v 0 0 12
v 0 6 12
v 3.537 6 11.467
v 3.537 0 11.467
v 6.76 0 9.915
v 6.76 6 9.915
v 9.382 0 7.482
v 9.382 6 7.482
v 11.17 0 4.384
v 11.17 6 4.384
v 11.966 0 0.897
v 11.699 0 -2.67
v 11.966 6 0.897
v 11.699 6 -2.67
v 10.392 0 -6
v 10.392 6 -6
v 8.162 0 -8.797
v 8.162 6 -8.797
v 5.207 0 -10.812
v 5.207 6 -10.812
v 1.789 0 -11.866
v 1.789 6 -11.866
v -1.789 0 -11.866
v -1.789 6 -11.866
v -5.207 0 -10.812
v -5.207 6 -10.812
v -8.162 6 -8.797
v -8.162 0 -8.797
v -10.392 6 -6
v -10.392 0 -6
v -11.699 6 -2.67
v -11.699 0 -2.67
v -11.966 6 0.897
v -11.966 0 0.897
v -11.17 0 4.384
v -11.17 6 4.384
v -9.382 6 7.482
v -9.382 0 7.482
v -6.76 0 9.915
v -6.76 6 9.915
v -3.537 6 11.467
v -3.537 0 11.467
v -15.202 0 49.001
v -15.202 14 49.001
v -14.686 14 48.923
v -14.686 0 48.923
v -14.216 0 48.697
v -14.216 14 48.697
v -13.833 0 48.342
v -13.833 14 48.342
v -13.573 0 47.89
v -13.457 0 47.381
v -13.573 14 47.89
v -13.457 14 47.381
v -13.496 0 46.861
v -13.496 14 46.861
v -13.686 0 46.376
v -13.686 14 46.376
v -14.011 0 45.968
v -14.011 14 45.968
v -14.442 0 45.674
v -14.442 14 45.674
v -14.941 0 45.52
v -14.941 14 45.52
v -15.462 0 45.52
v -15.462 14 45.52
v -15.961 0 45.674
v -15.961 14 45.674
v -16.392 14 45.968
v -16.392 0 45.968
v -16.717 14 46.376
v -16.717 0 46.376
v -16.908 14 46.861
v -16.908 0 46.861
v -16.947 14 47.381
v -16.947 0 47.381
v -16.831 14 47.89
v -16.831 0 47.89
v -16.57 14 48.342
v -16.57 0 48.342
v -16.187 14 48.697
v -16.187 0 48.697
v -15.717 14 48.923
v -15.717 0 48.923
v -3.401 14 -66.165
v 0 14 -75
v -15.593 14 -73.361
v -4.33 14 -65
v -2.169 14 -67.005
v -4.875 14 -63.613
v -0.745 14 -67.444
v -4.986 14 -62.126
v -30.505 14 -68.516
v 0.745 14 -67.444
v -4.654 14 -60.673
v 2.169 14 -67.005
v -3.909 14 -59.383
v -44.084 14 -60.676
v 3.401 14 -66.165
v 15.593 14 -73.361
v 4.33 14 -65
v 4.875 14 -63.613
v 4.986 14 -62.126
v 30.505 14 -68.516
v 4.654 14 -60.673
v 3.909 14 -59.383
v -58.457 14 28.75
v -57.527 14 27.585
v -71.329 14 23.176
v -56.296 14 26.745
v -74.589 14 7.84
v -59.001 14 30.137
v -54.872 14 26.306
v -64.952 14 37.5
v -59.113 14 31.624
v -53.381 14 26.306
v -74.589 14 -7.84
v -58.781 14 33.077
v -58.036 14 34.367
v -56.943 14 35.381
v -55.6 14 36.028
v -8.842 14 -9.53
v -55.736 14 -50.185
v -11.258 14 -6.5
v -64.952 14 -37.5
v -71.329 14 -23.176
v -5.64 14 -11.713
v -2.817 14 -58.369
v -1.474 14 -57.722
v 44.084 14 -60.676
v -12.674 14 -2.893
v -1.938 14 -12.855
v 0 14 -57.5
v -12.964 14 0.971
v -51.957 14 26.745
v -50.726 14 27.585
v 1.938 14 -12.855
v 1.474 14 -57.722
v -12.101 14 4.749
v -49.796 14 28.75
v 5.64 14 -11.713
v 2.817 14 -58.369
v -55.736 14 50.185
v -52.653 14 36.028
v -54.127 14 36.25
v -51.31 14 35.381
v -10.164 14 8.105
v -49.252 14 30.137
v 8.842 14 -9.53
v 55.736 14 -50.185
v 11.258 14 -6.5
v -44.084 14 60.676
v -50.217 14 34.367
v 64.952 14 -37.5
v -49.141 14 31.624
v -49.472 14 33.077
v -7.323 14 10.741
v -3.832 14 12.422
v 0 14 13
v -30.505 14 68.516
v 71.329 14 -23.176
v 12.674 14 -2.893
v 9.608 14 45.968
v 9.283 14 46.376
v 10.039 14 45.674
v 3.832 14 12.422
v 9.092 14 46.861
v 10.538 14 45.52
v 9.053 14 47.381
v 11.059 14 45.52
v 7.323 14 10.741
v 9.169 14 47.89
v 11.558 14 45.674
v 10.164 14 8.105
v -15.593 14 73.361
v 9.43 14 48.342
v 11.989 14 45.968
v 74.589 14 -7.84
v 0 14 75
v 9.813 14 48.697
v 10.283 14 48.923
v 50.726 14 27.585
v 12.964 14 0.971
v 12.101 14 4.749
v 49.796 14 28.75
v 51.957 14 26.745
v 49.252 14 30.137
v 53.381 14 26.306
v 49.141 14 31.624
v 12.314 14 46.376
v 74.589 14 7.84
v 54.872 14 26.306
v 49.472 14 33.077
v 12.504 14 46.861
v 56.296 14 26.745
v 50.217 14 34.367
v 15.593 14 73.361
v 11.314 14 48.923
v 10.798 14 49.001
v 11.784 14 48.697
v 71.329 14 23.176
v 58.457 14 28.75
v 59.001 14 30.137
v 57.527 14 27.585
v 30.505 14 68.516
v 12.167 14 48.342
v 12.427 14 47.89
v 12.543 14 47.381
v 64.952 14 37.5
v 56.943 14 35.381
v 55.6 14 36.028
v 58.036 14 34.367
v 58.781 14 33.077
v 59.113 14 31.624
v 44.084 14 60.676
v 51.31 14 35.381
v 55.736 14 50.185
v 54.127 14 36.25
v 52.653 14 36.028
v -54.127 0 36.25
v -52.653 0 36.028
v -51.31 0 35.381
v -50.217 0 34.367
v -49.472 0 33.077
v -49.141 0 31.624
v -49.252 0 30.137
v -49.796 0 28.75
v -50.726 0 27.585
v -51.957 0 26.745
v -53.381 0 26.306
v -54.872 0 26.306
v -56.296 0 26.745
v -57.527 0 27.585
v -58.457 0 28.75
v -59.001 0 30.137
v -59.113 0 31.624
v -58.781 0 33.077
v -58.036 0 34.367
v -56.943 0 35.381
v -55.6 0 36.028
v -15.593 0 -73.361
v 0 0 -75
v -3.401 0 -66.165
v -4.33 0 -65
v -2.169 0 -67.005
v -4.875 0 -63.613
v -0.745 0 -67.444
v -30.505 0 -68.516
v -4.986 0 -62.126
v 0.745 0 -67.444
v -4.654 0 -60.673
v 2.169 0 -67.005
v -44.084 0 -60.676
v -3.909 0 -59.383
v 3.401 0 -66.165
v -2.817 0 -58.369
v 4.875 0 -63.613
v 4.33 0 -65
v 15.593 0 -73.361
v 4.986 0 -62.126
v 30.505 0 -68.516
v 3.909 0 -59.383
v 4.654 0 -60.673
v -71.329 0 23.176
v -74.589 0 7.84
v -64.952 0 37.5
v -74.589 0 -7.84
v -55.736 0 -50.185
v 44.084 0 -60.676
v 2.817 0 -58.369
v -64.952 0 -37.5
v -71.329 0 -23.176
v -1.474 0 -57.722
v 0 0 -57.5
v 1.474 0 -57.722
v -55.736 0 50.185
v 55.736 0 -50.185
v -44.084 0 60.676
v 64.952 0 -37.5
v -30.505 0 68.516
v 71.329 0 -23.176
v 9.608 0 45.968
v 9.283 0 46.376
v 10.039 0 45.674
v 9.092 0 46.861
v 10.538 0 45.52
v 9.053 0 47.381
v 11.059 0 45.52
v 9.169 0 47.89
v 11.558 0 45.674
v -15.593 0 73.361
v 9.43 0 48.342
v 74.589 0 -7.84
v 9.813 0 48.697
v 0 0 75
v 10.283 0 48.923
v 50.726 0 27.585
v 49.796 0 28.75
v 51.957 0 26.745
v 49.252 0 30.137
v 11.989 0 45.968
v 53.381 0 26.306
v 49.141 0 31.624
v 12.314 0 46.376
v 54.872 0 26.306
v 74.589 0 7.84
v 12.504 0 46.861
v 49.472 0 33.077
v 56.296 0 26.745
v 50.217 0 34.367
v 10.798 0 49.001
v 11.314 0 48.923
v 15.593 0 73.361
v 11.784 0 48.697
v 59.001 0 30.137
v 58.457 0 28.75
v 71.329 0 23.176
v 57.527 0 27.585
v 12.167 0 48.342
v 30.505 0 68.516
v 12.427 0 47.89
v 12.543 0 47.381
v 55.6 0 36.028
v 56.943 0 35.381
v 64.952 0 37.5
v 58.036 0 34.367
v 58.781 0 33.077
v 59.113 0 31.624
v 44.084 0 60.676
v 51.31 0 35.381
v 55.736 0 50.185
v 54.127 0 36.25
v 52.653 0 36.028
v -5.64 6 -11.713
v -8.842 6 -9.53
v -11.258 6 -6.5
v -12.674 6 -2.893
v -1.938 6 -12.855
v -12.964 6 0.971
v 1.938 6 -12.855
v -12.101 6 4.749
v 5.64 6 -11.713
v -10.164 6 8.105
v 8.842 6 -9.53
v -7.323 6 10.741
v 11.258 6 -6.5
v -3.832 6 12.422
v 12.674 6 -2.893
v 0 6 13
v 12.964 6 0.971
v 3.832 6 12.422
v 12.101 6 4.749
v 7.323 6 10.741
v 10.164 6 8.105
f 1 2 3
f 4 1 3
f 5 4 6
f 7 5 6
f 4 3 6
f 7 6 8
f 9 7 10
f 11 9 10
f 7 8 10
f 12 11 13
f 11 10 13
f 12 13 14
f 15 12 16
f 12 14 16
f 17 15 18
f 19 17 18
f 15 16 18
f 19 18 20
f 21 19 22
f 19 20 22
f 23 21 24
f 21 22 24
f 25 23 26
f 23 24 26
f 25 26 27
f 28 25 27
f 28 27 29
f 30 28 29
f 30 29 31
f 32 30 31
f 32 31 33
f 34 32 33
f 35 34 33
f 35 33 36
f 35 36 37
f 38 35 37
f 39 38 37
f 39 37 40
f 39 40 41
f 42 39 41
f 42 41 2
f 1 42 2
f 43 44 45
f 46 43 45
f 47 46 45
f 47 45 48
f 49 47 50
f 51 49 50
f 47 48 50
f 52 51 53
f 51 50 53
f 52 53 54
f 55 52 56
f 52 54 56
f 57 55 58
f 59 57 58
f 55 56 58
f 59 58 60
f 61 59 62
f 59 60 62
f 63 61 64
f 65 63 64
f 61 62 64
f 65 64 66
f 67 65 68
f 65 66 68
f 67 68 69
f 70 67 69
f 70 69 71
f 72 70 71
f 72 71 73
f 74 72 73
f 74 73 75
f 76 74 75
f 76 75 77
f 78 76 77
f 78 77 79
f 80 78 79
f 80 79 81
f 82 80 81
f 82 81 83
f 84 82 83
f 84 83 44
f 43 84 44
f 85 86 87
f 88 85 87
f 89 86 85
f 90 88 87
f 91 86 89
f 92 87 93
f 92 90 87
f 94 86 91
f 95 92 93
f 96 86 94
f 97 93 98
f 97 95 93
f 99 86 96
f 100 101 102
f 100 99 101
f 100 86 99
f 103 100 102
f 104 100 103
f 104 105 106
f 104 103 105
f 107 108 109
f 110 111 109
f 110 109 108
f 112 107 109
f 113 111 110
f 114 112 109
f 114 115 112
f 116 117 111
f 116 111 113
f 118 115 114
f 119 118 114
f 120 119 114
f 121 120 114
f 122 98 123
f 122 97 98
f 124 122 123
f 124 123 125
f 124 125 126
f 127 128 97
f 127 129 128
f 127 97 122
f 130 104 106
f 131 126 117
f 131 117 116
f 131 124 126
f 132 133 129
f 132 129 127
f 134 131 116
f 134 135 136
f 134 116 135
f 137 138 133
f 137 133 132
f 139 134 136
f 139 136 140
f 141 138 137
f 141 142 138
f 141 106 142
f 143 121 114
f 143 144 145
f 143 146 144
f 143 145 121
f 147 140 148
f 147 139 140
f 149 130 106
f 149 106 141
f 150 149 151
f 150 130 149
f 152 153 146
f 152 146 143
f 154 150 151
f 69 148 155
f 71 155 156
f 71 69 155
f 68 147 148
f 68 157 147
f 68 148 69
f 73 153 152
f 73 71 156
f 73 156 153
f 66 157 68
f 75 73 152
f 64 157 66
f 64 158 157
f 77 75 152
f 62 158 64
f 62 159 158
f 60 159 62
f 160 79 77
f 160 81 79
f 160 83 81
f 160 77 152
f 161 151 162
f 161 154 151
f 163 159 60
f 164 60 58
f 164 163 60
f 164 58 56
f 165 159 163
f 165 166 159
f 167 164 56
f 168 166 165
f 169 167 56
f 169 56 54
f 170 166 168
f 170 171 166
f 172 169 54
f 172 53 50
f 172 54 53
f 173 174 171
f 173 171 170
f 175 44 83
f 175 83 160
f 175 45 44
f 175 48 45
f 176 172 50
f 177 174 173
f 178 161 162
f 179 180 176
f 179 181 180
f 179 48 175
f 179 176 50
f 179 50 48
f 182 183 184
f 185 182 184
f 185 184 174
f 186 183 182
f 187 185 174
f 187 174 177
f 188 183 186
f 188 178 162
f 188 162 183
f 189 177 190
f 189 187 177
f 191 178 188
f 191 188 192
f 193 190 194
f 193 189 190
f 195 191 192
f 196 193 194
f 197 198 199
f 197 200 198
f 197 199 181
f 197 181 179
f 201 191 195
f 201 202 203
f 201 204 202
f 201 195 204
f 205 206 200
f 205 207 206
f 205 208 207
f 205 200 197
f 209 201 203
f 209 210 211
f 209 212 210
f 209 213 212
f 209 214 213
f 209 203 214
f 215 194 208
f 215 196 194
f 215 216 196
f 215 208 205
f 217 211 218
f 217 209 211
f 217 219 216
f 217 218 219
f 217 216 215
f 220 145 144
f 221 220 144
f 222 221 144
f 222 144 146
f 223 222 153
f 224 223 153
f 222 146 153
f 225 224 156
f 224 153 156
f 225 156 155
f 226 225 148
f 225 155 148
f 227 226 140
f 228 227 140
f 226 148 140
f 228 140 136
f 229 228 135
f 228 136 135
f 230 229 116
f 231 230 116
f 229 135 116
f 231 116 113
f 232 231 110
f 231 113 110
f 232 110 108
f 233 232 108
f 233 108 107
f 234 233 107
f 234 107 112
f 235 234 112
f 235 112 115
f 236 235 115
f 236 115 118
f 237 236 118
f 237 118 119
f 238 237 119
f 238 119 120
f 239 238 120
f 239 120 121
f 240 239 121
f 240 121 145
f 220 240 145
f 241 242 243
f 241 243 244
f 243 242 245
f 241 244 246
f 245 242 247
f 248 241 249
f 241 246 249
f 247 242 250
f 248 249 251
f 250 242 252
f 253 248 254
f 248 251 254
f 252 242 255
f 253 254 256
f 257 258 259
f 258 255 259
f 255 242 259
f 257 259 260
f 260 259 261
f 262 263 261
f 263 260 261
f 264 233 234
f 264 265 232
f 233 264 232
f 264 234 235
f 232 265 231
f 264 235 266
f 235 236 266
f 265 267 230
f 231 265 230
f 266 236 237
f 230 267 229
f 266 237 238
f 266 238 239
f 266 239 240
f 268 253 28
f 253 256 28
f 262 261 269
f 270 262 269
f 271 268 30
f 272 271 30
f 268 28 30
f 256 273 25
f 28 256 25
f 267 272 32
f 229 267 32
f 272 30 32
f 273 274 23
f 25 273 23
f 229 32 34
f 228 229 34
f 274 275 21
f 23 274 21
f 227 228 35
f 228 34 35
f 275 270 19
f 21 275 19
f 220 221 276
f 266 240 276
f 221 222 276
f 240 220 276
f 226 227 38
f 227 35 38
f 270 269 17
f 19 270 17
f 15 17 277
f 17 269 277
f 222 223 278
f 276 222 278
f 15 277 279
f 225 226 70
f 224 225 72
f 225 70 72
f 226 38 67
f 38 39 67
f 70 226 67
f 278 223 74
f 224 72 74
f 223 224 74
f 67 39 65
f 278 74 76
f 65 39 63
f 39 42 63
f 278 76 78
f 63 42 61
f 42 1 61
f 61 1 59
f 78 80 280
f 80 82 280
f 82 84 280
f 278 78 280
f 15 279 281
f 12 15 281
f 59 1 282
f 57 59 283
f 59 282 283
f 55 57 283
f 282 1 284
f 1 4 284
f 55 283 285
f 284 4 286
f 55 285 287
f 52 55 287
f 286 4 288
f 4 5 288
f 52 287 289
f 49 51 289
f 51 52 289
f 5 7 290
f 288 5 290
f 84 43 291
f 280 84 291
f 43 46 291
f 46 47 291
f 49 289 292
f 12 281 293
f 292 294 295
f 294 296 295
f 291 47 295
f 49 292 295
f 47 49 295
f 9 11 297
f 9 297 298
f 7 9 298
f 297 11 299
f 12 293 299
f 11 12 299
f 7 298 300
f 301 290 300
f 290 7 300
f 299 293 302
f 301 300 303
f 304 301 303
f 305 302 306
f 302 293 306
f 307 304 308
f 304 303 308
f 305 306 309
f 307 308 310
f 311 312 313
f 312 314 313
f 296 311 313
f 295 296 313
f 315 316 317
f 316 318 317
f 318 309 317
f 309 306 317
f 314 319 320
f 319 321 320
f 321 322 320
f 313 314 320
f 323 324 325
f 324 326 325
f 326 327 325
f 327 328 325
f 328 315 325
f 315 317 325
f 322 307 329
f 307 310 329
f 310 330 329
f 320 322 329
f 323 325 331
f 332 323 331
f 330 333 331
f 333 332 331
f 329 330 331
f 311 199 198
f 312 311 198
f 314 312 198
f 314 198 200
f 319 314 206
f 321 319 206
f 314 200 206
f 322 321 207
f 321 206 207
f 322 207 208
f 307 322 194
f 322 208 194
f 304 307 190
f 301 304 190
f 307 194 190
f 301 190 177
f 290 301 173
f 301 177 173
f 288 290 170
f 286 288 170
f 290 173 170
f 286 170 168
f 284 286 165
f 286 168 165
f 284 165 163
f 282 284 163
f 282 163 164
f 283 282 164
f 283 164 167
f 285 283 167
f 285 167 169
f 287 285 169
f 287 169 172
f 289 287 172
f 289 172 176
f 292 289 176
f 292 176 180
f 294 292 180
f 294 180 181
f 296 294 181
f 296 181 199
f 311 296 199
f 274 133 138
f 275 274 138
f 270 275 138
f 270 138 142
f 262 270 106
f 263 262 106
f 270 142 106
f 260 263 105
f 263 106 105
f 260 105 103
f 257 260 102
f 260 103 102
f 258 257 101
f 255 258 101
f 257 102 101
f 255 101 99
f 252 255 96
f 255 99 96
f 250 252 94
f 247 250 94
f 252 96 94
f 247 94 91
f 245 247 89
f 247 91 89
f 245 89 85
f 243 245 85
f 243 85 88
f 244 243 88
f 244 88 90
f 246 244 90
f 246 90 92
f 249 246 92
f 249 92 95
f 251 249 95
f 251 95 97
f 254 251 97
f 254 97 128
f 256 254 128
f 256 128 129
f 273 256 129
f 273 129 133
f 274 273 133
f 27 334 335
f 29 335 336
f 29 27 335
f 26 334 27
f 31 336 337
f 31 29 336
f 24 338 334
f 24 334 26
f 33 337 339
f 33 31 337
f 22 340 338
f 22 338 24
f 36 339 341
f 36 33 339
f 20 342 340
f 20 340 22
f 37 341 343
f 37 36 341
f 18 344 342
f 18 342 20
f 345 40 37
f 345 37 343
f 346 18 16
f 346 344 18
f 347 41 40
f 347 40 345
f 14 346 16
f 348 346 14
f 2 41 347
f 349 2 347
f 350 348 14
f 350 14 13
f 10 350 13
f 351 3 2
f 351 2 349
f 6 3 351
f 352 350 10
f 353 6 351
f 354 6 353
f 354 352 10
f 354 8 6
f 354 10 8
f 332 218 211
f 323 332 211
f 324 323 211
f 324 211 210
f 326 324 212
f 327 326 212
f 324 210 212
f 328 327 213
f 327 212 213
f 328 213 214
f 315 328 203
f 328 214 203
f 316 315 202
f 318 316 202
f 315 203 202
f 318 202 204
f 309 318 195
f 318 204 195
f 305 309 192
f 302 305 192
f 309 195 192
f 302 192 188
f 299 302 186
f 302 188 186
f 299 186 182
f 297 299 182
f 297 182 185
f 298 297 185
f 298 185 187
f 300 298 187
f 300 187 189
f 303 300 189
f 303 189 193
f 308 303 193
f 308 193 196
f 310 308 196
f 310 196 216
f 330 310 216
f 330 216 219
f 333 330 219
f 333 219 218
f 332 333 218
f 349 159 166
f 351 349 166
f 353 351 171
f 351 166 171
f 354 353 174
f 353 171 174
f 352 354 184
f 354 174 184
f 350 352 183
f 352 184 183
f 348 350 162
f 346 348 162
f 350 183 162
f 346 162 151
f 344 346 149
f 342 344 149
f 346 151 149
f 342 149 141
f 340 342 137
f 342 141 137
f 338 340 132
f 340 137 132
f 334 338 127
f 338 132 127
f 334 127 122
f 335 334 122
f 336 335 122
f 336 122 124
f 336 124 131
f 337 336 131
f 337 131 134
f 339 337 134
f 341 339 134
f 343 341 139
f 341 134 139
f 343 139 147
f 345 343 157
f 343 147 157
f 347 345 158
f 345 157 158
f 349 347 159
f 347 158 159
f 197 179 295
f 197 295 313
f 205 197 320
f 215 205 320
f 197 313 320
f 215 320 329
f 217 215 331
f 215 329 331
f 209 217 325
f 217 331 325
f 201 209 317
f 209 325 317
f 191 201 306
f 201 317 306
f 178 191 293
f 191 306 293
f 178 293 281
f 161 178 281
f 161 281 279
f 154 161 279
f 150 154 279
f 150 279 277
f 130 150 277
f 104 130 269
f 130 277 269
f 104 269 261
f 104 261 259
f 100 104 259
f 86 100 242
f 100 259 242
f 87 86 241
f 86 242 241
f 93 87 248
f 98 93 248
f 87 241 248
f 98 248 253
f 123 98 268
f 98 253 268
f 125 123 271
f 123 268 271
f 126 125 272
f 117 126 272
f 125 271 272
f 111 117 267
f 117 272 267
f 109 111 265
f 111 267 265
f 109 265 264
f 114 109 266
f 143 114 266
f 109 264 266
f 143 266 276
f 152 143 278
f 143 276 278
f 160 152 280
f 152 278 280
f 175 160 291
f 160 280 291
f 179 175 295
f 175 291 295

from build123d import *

# Parameters (mm, degrees)
SKETCH1_R           = 75
BOSS_EXTRUDE1_DEPTH = 14
SKETCH2_R           = 13
CUT_EXTRUDE1_DEPTH  = 8
SKETCH3_R           = 12
CUT_EXTRUDE2_DEPTH  = 8
SKETCH4_R           = 5
CUT_EXTRUDE4_DEPTH  = 107.98598039
SKETCH5_R           = 1.75
CUT_EXTRUDE5_DEPTH  = 107.98598039


with BuildPart() as part:
    # Sketch1 → Boss-Extrude1 (new body)
    with BuildSketch(Plane(origin=(0, 0, 0), x_dir=(1, 0, 0), z_dir=(0, 1, 0))):
        with Locations(Location((0, 0, 0), (0, 0, 270))):
            Circle(SKETCH1_R)
    extrude(amount=BOSS_EXTRUDE1_DEPTH)

    # Sketch2 → Cut-Extrude1 (cut)
    with BuildSketch(Plane(origin=(0, 14, 0), x_dir=(1, 0, 0), z_dir=(0, 1, 0))):
        with Locations(Location((0, 0, 0), (0, 0, 270))):
            Circle(SKETCH2_R)
    extrude(amount=-CUT_EXTRUDE1_DEPTH, mode=Mode.SUBTRACT)

    # Sketch3 → Cut-Extrude2 (cut)
    with BuildSketch(Plane(origin=(0, 6, 0), x_dir=(1, 0, 0), z_dir=(0, 1, 0))):
        with Locations(Location((0, 0, 0), (0, 0, 270))):
            Circle(SKETCH3_R)
    extrude(amount=-CUT_EXTRUDE2_DEPTH, mode=Mode.SUBTRACT)

    # Sketch4 → Cut-Extrude4 (cut, through all)
    with BuildSketch(Plane(origin=(0, 14, 0), x_dir=(1, 0, 0), z_dir=(0, 1, 0))):
        with Locations(Location((0, 62.5, 0), (0, 0, 270))):
            Circle(SKETCH4_R)
        with Locations(Location((-54.126587737, -31.25, 0), (0, 0, 270))):
            Circle(SKETCH4_R)
        with Locations(Location((54.126587737, -31.25, 0), (0, 0, 270))):
            Circle(SKETCH4_R)
    extrude(amount=-CUT_EXTRUDE4_DEPTH, mode=Mode.SUBTRACT)

    # Sketch5 → Cut-Extrude5 (cut, through all)
    with BuildSketch(Plane(origin=(0, 14, 0), x_dir=(1, 0, 0), z_dir=(0, 1, 0))):
        with Locations(Location((-15.201634245, -47.250661584, 0), (0, 0, 270))):
            Circle(SKETCH5_R)
        with Locations(Location((10.798365755, -47.250661584, 0), (0, 0, 270))):
            Circle(SKETCH5_R)
    extrude(amount=-CUT_EXTRUDE5_DEPTH, mode=Mode.SUBTRACT)


solid = part.part
